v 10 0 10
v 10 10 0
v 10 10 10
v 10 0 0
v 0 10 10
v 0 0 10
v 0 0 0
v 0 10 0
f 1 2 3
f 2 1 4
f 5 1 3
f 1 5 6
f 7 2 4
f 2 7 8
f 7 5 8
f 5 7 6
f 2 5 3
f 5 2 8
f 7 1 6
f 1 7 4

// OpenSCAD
// inner blue cube fully inside red: hidden region
color("red") cube(10);
color("blue") translate([3,3,3]) cube(4);
